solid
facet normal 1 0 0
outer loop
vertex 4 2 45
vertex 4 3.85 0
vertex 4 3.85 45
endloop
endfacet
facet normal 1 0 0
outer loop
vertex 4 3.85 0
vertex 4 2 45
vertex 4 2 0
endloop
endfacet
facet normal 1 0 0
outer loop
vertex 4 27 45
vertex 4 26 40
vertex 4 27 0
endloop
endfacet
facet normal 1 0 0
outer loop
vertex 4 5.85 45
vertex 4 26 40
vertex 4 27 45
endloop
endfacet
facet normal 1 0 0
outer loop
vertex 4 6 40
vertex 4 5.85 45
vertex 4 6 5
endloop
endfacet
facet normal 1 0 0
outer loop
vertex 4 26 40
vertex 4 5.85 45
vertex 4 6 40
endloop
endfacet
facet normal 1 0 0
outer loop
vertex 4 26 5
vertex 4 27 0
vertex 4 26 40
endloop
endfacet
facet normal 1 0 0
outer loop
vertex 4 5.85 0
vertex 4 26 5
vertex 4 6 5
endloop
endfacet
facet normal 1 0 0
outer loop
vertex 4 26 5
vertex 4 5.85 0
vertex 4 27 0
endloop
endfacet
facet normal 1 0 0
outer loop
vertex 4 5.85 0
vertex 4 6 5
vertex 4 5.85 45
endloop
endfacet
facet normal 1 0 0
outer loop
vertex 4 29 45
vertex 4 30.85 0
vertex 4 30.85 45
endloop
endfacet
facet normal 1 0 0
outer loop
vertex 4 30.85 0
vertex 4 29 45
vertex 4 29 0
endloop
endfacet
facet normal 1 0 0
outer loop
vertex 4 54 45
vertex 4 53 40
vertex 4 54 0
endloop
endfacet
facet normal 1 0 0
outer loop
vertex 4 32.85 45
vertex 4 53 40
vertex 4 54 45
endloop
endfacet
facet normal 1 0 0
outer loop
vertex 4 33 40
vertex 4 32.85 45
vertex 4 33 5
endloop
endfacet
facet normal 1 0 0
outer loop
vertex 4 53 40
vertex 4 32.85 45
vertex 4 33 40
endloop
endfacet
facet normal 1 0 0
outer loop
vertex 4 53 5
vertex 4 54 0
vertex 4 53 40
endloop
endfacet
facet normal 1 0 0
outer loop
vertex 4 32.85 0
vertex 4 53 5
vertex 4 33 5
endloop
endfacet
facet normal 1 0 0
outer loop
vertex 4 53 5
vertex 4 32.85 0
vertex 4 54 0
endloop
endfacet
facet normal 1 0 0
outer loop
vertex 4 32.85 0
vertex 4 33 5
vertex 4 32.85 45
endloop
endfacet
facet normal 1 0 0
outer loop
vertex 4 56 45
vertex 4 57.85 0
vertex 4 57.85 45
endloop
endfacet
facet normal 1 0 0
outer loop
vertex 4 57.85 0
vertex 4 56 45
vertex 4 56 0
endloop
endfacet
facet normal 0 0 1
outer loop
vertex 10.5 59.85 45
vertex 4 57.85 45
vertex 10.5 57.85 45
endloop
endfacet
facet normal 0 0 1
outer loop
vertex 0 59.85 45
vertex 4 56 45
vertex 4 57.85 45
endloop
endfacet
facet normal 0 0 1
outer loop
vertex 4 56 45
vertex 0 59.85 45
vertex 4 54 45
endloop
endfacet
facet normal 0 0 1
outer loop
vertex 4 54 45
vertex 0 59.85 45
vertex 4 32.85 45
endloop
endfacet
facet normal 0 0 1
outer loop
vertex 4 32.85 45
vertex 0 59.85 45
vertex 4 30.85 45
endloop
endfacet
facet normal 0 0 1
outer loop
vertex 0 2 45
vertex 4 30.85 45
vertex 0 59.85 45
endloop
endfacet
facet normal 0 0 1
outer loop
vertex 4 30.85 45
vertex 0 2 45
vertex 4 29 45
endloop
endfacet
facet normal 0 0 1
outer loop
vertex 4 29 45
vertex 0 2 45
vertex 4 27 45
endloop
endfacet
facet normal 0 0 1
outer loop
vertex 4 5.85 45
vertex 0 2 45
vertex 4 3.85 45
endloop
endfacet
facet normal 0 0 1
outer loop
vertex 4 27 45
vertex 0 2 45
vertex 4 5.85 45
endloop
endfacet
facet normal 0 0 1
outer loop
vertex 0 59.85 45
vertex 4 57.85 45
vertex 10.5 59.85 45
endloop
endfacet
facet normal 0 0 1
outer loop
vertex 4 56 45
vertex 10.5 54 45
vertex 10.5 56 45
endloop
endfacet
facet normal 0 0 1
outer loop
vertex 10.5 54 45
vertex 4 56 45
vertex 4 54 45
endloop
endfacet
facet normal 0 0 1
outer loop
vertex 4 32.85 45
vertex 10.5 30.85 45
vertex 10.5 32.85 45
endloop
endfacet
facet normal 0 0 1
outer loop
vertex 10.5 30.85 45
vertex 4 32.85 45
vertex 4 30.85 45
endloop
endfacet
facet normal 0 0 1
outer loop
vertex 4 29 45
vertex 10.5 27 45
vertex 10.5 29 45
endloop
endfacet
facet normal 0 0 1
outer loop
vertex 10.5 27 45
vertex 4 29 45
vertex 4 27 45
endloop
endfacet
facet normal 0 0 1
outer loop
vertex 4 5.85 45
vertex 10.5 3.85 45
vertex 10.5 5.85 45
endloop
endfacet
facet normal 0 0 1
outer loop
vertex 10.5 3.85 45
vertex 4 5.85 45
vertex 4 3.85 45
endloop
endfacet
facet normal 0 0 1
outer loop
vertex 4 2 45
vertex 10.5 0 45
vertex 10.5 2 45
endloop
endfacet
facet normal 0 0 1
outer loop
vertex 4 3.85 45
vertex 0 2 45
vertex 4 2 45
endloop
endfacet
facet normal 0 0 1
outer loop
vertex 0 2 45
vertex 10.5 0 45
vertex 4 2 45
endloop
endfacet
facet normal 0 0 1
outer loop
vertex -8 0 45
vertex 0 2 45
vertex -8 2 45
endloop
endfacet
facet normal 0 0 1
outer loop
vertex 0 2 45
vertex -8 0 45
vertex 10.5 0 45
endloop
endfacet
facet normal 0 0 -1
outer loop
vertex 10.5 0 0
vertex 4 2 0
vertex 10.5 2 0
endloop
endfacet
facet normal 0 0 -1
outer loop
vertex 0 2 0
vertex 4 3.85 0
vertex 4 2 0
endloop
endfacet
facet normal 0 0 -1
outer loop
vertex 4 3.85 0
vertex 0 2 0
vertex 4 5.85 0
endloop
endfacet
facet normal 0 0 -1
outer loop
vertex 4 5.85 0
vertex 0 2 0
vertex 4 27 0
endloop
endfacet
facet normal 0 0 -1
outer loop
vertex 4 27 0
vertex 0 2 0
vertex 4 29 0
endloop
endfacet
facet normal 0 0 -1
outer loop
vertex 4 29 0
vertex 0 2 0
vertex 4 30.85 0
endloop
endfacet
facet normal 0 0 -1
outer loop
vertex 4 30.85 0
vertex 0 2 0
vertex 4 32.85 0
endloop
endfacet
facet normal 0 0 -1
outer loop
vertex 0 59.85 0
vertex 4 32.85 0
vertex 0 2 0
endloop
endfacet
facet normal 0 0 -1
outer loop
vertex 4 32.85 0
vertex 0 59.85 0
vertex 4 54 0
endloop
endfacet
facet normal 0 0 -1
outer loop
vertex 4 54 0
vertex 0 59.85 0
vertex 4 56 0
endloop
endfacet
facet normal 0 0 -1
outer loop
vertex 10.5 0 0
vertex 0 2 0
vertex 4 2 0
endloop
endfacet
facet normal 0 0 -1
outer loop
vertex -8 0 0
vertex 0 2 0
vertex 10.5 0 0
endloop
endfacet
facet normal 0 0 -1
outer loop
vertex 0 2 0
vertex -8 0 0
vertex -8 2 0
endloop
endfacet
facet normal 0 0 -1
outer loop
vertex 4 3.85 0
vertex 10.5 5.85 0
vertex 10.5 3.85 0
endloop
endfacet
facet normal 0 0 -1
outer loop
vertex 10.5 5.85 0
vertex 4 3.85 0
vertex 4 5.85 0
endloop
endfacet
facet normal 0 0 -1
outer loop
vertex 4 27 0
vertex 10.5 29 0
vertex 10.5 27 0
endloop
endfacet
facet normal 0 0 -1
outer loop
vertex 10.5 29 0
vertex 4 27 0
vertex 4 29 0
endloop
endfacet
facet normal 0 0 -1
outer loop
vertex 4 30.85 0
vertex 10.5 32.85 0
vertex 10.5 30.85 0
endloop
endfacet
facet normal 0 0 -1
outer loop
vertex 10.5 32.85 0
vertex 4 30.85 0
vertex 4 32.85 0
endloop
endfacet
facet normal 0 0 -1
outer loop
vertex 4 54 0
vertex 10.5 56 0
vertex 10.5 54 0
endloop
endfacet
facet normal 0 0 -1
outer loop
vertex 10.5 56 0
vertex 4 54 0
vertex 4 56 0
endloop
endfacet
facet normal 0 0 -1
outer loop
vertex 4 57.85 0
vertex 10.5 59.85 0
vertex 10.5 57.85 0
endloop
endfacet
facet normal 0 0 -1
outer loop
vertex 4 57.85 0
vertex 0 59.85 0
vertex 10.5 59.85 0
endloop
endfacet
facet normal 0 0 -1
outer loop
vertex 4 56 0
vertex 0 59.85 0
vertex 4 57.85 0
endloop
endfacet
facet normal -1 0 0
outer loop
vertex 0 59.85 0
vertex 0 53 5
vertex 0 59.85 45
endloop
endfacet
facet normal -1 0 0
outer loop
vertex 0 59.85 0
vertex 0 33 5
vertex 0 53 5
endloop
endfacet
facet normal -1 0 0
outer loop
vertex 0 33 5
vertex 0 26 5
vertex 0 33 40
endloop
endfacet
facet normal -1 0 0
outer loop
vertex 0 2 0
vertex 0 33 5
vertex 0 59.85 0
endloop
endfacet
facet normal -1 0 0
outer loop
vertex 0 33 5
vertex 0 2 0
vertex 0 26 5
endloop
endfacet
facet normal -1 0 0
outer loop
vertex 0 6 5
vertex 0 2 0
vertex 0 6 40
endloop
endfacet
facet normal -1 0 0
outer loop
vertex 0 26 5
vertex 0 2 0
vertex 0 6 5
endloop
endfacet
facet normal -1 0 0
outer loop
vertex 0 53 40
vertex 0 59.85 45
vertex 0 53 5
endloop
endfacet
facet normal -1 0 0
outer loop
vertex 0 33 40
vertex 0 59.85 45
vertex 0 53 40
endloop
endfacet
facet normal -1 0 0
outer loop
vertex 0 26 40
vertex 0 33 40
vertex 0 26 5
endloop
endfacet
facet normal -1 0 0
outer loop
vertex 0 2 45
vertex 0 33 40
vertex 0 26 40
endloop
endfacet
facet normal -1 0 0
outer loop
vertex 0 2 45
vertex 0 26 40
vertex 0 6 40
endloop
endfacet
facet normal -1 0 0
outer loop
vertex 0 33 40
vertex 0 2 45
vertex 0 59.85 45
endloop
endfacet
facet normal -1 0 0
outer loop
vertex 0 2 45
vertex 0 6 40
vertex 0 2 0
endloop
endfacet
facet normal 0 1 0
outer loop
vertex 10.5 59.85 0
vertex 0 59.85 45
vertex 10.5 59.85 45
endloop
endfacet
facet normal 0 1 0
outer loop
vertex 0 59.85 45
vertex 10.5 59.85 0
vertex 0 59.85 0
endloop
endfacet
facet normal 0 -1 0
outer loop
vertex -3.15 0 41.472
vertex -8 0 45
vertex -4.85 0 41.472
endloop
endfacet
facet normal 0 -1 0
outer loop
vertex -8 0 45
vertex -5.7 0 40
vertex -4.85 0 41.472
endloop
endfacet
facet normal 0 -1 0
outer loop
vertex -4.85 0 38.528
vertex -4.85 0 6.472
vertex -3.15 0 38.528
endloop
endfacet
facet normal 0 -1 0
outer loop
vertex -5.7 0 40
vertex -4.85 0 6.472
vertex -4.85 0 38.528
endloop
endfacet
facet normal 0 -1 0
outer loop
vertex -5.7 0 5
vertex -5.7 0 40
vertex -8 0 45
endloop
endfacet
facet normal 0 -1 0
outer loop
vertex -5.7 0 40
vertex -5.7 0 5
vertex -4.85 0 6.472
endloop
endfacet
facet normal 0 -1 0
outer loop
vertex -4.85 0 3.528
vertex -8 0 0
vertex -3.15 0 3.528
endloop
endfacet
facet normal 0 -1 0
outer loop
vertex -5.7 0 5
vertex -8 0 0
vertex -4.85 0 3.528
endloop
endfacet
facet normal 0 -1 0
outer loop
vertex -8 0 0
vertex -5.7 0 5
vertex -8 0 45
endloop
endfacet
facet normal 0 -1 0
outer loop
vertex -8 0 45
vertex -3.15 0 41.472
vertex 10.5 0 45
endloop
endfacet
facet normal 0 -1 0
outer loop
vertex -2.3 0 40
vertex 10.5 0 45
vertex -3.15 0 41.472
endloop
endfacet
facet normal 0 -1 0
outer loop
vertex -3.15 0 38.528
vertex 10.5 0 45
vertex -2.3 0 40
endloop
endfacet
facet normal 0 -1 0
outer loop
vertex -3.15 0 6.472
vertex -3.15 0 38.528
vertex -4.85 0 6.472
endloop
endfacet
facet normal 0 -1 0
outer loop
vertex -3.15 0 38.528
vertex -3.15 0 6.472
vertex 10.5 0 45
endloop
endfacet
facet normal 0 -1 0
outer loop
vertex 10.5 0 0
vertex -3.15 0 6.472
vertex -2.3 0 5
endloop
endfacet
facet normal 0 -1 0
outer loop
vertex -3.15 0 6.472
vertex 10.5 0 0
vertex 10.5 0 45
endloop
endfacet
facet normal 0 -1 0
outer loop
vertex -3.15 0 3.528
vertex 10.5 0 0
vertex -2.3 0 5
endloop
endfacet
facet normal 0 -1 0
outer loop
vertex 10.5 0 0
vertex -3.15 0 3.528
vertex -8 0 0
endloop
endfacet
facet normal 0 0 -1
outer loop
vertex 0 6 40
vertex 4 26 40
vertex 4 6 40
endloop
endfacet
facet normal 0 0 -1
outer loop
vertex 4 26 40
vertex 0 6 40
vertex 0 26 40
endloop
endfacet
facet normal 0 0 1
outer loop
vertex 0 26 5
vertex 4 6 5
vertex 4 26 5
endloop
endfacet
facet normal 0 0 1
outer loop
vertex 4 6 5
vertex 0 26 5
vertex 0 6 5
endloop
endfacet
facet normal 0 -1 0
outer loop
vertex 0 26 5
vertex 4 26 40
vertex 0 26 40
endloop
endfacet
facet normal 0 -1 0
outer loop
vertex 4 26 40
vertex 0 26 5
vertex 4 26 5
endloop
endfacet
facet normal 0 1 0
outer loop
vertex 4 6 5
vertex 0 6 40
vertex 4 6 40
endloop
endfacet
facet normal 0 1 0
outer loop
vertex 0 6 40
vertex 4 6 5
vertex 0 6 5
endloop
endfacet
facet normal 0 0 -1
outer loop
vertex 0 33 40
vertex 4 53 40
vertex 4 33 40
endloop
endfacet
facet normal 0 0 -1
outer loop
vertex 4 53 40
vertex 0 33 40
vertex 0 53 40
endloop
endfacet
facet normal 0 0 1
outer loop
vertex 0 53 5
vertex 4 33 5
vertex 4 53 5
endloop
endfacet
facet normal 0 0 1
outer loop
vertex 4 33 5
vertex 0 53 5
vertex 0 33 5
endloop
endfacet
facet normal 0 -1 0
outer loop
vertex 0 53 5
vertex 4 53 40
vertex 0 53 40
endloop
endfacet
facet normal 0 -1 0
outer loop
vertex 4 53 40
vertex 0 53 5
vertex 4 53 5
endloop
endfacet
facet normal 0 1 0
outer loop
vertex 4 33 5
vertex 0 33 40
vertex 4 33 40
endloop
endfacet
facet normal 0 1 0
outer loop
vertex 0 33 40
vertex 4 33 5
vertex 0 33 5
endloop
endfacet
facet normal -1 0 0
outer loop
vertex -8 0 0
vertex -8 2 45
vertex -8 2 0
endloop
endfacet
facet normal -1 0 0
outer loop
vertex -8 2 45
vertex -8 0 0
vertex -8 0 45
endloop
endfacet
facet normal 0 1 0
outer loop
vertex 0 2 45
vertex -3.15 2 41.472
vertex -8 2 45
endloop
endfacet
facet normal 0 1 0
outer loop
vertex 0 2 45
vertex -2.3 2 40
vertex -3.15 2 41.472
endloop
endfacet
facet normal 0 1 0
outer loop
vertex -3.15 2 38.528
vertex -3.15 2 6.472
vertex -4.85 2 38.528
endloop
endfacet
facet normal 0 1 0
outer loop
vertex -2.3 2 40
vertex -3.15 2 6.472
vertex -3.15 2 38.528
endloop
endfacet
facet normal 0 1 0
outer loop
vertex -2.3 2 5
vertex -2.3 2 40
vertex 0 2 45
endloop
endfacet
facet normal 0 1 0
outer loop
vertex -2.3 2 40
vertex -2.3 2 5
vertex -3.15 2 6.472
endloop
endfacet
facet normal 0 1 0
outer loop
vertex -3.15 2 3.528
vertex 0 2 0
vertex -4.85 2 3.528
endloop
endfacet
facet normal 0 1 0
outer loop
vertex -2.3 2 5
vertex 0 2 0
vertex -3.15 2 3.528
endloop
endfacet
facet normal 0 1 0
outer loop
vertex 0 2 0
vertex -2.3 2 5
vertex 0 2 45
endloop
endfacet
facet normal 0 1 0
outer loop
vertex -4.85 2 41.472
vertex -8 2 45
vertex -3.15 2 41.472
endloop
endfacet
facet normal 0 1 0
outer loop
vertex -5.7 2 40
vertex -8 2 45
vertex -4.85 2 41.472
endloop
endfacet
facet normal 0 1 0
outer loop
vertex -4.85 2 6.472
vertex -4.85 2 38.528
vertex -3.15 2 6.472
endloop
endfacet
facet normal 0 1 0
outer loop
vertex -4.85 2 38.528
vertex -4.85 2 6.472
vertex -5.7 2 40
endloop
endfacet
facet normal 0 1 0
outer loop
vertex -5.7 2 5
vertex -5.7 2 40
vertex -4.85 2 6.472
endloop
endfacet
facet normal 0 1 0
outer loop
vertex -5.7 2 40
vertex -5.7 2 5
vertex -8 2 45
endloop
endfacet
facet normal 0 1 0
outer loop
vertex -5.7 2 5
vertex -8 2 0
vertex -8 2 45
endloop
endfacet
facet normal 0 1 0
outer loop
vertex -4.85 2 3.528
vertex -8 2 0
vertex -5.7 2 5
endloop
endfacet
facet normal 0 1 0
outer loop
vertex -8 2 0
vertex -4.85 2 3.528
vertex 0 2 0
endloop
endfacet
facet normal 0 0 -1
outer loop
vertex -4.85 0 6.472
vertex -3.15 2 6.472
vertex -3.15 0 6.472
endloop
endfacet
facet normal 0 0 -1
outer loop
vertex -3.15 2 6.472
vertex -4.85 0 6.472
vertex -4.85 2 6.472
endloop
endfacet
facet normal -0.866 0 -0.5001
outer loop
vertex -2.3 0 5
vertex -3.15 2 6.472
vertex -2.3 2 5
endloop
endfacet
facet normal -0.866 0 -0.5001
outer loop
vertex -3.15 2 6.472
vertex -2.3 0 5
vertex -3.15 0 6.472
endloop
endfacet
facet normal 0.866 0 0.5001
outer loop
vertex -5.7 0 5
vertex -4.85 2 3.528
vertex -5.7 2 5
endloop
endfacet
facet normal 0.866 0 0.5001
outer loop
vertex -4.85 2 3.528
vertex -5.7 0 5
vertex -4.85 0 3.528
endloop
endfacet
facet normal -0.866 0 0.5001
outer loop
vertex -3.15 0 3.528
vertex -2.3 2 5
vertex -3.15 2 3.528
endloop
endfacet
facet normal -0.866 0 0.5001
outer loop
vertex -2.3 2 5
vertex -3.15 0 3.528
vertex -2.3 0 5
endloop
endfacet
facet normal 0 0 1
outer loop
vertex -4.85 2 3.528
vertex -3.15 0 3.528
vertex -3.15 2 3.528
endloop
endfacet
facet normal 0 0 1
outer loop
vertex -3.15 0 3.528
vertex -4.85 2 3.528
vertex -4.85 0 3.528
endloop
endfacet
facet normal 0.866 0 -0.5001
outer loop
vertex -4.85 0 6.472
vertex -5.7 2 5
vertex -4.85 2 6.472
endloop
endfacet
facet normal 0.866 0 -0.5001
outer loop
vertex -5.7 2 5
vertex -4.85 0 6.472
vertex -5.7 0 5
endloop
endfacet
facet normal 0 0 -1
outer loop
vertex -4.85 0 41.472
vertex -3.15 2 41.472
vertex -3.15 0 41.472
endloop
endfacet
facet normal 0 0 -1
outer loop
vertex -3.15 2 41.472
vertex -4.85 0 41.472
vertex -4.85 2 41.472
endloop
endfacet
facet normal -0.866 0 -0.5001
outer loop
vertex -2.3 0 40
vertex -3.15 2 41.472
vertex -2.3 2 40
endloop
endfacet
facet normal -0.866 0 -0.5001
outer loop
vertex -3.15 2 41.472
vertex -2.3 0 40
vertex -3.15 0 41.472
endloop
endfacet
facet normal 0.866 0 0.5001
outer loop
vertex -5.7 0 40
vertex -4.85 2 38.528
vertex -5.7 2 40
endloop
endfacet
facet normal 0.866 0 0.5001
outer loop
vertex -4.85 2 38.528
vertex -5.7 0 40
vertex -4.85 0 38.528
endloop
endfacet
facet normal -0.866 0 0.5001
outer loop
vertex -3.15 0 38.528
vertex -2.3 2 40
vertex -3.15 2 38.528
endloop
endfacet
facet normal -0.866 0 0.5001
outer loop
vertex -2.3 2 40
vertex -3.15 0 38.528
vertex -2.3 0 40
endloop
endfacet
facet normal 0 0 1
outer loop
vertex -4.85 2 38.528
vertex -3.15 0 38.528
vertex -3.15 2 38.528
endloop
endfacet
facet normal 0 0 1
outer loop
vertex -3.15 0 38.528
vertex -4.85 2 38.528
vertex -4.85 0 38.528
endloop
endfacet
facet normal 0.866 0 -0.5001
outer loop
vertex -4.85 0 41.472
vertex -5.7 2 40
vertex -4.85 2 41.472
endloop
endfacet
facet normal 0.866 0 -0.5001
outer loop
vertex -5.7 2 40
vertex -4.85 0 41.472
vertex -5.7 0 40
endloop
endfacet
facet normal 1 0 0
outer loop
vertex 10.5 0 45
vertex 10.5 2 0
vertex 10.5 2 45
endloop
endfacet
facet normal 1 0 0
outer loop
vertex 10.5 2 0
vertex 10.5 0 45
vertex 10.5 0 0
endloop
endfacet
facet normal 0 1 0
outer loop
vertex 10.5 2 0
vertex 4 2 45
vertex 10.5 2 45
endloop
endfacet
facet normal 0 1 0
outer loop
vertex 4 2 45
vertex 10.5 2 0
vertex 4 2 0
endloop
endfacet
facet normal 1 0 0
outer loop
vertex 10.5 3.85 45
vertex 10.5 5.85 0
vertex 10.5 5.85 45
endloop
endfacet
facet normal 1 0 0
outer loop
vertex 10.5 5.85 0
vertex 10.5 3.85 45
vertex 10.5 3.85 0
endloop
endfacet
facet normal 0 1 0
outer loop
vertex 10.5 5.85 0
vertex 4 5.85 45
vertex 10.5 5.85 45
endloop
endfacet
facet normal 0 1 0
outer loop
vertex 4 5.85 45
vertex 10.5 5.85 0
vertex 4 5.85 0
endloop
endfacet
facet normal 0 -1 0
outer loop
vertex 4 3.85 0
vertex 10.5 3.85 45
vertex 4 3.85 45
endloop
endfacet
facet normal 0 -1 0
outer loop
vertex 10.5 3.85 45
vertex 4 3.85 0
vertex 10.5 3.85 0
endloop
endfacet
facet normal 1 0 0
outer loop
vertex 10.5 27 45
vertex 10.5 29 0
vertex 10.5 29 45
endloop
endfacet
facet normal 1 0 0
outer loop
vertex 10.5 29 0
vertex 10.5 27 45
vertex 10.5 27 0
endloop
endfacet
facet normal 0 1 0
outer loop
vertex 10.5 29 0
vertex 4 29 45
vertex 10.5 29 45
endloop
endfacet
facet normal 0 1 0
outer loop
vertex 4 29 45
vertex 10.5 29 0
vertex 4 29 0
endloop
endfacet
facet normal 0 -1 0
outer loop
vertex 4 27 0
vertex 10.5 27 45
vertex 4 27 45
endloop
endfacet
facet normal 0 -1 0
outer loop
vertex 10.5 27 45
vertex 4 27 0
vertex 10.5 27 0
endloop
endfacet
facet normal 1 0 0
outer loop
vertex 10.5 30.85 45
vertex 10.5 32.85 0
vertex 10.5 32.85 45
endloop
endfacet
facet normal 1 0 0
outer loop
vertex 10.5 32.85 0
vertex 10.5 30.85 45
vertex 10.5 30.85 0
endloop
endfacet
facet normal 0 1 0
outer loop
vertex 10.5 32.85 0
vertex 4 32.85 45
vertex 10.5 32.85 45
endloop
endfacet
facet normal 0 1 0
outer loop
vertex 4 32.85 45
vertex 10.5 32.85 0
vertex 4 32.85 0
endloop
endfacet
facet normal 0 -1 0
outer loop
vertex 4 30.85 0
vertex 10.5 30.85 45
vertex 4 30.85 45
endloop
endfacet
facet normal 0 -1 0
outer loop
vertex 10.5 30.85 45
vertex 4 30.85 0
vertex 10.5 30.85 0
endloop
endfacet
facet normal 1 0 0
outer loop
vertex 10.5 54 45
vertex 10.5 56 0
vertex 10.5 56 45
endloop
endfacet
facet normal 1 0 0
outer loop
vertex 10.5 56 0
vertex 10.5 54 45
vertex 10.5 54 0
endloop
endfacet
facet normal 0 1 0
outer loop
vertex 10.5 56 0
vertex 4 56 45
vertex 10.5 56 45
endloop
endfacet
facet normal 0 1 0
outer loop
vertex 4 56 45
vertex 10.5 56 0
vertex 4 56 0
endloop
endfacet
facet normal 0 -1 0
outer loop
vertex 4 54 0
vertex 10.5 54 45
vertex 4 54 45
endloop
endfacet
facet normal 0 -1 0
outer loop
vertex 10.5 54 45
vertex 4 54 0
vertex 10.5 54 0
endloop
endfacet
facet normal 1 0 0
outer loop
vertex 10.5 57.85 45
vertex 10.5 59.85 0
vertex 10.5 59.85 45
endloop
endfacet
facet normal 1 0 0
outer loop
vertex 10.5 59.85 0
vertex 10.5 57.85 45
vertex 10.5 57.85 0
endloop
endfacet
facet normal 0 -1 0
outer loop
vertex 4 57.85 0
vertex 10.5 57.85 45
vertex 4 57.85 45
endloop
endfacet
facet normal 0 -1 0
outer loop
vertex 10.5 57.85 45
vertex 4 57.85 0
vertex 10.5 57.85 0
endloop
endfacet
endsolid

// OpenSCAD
board_width = 45;
board_thickness = 1.85;
board_separation = 27;

platform_thickness = 2;

module ledge() {
  union() {
    cube(size = [6.5,platform_thickness,board_width]);
    translate([0,platform_thickness+board_thickness,0])
      cube(size = [6.5,platform_thickness,board_width]);

//    translate([0,platform_thickness+1,0])
//      rotate(a=[90,0,0])
//        translate([6,3,0])
//          cylinder(h=platform_thickness+1,r=1.3);

//    translate([0,platform_thickness+1,board_width-6])
//      rotate(a=[90,0,0])
//        translate([6,3,0])
//          cylinder(h=platform_thickness+1,r=1.3);
  }
}

module mount() {
  translate([-8,0,0]) {

    difference() {
      cube(size=[8,platform_thickness,board_width]);

      translate([0,platform_thickness+.25,0])
        rotate(a=[90,0,0])
          translate([4,5,0])
            cylinder(h=platform_thickness+.5,r=1.7);

      translate([0,platform_thickness+.25,board_width-6])
        rotate(a=[90,0,0])
          translate([4,1,0])
            cylinder(h=platform_thickness+.5,r=1.7);
    }
  }
}

difference() {
  cube(size = [4,2*board_separation+platform_thickness*2+board_thickness,board_width]);
  translate([-.5,6,5])
    cube(size=[5,20,board_width-10]);
  translate([-.5,6+board_separation,5])
    cube(size=[5,20,board_width-10]);
}

mount();


translate([4,0,0])
  ledge();
translate([4,board_separation,0])
  ledge();
translate([4,board_separation*2,0])
  ledge();
